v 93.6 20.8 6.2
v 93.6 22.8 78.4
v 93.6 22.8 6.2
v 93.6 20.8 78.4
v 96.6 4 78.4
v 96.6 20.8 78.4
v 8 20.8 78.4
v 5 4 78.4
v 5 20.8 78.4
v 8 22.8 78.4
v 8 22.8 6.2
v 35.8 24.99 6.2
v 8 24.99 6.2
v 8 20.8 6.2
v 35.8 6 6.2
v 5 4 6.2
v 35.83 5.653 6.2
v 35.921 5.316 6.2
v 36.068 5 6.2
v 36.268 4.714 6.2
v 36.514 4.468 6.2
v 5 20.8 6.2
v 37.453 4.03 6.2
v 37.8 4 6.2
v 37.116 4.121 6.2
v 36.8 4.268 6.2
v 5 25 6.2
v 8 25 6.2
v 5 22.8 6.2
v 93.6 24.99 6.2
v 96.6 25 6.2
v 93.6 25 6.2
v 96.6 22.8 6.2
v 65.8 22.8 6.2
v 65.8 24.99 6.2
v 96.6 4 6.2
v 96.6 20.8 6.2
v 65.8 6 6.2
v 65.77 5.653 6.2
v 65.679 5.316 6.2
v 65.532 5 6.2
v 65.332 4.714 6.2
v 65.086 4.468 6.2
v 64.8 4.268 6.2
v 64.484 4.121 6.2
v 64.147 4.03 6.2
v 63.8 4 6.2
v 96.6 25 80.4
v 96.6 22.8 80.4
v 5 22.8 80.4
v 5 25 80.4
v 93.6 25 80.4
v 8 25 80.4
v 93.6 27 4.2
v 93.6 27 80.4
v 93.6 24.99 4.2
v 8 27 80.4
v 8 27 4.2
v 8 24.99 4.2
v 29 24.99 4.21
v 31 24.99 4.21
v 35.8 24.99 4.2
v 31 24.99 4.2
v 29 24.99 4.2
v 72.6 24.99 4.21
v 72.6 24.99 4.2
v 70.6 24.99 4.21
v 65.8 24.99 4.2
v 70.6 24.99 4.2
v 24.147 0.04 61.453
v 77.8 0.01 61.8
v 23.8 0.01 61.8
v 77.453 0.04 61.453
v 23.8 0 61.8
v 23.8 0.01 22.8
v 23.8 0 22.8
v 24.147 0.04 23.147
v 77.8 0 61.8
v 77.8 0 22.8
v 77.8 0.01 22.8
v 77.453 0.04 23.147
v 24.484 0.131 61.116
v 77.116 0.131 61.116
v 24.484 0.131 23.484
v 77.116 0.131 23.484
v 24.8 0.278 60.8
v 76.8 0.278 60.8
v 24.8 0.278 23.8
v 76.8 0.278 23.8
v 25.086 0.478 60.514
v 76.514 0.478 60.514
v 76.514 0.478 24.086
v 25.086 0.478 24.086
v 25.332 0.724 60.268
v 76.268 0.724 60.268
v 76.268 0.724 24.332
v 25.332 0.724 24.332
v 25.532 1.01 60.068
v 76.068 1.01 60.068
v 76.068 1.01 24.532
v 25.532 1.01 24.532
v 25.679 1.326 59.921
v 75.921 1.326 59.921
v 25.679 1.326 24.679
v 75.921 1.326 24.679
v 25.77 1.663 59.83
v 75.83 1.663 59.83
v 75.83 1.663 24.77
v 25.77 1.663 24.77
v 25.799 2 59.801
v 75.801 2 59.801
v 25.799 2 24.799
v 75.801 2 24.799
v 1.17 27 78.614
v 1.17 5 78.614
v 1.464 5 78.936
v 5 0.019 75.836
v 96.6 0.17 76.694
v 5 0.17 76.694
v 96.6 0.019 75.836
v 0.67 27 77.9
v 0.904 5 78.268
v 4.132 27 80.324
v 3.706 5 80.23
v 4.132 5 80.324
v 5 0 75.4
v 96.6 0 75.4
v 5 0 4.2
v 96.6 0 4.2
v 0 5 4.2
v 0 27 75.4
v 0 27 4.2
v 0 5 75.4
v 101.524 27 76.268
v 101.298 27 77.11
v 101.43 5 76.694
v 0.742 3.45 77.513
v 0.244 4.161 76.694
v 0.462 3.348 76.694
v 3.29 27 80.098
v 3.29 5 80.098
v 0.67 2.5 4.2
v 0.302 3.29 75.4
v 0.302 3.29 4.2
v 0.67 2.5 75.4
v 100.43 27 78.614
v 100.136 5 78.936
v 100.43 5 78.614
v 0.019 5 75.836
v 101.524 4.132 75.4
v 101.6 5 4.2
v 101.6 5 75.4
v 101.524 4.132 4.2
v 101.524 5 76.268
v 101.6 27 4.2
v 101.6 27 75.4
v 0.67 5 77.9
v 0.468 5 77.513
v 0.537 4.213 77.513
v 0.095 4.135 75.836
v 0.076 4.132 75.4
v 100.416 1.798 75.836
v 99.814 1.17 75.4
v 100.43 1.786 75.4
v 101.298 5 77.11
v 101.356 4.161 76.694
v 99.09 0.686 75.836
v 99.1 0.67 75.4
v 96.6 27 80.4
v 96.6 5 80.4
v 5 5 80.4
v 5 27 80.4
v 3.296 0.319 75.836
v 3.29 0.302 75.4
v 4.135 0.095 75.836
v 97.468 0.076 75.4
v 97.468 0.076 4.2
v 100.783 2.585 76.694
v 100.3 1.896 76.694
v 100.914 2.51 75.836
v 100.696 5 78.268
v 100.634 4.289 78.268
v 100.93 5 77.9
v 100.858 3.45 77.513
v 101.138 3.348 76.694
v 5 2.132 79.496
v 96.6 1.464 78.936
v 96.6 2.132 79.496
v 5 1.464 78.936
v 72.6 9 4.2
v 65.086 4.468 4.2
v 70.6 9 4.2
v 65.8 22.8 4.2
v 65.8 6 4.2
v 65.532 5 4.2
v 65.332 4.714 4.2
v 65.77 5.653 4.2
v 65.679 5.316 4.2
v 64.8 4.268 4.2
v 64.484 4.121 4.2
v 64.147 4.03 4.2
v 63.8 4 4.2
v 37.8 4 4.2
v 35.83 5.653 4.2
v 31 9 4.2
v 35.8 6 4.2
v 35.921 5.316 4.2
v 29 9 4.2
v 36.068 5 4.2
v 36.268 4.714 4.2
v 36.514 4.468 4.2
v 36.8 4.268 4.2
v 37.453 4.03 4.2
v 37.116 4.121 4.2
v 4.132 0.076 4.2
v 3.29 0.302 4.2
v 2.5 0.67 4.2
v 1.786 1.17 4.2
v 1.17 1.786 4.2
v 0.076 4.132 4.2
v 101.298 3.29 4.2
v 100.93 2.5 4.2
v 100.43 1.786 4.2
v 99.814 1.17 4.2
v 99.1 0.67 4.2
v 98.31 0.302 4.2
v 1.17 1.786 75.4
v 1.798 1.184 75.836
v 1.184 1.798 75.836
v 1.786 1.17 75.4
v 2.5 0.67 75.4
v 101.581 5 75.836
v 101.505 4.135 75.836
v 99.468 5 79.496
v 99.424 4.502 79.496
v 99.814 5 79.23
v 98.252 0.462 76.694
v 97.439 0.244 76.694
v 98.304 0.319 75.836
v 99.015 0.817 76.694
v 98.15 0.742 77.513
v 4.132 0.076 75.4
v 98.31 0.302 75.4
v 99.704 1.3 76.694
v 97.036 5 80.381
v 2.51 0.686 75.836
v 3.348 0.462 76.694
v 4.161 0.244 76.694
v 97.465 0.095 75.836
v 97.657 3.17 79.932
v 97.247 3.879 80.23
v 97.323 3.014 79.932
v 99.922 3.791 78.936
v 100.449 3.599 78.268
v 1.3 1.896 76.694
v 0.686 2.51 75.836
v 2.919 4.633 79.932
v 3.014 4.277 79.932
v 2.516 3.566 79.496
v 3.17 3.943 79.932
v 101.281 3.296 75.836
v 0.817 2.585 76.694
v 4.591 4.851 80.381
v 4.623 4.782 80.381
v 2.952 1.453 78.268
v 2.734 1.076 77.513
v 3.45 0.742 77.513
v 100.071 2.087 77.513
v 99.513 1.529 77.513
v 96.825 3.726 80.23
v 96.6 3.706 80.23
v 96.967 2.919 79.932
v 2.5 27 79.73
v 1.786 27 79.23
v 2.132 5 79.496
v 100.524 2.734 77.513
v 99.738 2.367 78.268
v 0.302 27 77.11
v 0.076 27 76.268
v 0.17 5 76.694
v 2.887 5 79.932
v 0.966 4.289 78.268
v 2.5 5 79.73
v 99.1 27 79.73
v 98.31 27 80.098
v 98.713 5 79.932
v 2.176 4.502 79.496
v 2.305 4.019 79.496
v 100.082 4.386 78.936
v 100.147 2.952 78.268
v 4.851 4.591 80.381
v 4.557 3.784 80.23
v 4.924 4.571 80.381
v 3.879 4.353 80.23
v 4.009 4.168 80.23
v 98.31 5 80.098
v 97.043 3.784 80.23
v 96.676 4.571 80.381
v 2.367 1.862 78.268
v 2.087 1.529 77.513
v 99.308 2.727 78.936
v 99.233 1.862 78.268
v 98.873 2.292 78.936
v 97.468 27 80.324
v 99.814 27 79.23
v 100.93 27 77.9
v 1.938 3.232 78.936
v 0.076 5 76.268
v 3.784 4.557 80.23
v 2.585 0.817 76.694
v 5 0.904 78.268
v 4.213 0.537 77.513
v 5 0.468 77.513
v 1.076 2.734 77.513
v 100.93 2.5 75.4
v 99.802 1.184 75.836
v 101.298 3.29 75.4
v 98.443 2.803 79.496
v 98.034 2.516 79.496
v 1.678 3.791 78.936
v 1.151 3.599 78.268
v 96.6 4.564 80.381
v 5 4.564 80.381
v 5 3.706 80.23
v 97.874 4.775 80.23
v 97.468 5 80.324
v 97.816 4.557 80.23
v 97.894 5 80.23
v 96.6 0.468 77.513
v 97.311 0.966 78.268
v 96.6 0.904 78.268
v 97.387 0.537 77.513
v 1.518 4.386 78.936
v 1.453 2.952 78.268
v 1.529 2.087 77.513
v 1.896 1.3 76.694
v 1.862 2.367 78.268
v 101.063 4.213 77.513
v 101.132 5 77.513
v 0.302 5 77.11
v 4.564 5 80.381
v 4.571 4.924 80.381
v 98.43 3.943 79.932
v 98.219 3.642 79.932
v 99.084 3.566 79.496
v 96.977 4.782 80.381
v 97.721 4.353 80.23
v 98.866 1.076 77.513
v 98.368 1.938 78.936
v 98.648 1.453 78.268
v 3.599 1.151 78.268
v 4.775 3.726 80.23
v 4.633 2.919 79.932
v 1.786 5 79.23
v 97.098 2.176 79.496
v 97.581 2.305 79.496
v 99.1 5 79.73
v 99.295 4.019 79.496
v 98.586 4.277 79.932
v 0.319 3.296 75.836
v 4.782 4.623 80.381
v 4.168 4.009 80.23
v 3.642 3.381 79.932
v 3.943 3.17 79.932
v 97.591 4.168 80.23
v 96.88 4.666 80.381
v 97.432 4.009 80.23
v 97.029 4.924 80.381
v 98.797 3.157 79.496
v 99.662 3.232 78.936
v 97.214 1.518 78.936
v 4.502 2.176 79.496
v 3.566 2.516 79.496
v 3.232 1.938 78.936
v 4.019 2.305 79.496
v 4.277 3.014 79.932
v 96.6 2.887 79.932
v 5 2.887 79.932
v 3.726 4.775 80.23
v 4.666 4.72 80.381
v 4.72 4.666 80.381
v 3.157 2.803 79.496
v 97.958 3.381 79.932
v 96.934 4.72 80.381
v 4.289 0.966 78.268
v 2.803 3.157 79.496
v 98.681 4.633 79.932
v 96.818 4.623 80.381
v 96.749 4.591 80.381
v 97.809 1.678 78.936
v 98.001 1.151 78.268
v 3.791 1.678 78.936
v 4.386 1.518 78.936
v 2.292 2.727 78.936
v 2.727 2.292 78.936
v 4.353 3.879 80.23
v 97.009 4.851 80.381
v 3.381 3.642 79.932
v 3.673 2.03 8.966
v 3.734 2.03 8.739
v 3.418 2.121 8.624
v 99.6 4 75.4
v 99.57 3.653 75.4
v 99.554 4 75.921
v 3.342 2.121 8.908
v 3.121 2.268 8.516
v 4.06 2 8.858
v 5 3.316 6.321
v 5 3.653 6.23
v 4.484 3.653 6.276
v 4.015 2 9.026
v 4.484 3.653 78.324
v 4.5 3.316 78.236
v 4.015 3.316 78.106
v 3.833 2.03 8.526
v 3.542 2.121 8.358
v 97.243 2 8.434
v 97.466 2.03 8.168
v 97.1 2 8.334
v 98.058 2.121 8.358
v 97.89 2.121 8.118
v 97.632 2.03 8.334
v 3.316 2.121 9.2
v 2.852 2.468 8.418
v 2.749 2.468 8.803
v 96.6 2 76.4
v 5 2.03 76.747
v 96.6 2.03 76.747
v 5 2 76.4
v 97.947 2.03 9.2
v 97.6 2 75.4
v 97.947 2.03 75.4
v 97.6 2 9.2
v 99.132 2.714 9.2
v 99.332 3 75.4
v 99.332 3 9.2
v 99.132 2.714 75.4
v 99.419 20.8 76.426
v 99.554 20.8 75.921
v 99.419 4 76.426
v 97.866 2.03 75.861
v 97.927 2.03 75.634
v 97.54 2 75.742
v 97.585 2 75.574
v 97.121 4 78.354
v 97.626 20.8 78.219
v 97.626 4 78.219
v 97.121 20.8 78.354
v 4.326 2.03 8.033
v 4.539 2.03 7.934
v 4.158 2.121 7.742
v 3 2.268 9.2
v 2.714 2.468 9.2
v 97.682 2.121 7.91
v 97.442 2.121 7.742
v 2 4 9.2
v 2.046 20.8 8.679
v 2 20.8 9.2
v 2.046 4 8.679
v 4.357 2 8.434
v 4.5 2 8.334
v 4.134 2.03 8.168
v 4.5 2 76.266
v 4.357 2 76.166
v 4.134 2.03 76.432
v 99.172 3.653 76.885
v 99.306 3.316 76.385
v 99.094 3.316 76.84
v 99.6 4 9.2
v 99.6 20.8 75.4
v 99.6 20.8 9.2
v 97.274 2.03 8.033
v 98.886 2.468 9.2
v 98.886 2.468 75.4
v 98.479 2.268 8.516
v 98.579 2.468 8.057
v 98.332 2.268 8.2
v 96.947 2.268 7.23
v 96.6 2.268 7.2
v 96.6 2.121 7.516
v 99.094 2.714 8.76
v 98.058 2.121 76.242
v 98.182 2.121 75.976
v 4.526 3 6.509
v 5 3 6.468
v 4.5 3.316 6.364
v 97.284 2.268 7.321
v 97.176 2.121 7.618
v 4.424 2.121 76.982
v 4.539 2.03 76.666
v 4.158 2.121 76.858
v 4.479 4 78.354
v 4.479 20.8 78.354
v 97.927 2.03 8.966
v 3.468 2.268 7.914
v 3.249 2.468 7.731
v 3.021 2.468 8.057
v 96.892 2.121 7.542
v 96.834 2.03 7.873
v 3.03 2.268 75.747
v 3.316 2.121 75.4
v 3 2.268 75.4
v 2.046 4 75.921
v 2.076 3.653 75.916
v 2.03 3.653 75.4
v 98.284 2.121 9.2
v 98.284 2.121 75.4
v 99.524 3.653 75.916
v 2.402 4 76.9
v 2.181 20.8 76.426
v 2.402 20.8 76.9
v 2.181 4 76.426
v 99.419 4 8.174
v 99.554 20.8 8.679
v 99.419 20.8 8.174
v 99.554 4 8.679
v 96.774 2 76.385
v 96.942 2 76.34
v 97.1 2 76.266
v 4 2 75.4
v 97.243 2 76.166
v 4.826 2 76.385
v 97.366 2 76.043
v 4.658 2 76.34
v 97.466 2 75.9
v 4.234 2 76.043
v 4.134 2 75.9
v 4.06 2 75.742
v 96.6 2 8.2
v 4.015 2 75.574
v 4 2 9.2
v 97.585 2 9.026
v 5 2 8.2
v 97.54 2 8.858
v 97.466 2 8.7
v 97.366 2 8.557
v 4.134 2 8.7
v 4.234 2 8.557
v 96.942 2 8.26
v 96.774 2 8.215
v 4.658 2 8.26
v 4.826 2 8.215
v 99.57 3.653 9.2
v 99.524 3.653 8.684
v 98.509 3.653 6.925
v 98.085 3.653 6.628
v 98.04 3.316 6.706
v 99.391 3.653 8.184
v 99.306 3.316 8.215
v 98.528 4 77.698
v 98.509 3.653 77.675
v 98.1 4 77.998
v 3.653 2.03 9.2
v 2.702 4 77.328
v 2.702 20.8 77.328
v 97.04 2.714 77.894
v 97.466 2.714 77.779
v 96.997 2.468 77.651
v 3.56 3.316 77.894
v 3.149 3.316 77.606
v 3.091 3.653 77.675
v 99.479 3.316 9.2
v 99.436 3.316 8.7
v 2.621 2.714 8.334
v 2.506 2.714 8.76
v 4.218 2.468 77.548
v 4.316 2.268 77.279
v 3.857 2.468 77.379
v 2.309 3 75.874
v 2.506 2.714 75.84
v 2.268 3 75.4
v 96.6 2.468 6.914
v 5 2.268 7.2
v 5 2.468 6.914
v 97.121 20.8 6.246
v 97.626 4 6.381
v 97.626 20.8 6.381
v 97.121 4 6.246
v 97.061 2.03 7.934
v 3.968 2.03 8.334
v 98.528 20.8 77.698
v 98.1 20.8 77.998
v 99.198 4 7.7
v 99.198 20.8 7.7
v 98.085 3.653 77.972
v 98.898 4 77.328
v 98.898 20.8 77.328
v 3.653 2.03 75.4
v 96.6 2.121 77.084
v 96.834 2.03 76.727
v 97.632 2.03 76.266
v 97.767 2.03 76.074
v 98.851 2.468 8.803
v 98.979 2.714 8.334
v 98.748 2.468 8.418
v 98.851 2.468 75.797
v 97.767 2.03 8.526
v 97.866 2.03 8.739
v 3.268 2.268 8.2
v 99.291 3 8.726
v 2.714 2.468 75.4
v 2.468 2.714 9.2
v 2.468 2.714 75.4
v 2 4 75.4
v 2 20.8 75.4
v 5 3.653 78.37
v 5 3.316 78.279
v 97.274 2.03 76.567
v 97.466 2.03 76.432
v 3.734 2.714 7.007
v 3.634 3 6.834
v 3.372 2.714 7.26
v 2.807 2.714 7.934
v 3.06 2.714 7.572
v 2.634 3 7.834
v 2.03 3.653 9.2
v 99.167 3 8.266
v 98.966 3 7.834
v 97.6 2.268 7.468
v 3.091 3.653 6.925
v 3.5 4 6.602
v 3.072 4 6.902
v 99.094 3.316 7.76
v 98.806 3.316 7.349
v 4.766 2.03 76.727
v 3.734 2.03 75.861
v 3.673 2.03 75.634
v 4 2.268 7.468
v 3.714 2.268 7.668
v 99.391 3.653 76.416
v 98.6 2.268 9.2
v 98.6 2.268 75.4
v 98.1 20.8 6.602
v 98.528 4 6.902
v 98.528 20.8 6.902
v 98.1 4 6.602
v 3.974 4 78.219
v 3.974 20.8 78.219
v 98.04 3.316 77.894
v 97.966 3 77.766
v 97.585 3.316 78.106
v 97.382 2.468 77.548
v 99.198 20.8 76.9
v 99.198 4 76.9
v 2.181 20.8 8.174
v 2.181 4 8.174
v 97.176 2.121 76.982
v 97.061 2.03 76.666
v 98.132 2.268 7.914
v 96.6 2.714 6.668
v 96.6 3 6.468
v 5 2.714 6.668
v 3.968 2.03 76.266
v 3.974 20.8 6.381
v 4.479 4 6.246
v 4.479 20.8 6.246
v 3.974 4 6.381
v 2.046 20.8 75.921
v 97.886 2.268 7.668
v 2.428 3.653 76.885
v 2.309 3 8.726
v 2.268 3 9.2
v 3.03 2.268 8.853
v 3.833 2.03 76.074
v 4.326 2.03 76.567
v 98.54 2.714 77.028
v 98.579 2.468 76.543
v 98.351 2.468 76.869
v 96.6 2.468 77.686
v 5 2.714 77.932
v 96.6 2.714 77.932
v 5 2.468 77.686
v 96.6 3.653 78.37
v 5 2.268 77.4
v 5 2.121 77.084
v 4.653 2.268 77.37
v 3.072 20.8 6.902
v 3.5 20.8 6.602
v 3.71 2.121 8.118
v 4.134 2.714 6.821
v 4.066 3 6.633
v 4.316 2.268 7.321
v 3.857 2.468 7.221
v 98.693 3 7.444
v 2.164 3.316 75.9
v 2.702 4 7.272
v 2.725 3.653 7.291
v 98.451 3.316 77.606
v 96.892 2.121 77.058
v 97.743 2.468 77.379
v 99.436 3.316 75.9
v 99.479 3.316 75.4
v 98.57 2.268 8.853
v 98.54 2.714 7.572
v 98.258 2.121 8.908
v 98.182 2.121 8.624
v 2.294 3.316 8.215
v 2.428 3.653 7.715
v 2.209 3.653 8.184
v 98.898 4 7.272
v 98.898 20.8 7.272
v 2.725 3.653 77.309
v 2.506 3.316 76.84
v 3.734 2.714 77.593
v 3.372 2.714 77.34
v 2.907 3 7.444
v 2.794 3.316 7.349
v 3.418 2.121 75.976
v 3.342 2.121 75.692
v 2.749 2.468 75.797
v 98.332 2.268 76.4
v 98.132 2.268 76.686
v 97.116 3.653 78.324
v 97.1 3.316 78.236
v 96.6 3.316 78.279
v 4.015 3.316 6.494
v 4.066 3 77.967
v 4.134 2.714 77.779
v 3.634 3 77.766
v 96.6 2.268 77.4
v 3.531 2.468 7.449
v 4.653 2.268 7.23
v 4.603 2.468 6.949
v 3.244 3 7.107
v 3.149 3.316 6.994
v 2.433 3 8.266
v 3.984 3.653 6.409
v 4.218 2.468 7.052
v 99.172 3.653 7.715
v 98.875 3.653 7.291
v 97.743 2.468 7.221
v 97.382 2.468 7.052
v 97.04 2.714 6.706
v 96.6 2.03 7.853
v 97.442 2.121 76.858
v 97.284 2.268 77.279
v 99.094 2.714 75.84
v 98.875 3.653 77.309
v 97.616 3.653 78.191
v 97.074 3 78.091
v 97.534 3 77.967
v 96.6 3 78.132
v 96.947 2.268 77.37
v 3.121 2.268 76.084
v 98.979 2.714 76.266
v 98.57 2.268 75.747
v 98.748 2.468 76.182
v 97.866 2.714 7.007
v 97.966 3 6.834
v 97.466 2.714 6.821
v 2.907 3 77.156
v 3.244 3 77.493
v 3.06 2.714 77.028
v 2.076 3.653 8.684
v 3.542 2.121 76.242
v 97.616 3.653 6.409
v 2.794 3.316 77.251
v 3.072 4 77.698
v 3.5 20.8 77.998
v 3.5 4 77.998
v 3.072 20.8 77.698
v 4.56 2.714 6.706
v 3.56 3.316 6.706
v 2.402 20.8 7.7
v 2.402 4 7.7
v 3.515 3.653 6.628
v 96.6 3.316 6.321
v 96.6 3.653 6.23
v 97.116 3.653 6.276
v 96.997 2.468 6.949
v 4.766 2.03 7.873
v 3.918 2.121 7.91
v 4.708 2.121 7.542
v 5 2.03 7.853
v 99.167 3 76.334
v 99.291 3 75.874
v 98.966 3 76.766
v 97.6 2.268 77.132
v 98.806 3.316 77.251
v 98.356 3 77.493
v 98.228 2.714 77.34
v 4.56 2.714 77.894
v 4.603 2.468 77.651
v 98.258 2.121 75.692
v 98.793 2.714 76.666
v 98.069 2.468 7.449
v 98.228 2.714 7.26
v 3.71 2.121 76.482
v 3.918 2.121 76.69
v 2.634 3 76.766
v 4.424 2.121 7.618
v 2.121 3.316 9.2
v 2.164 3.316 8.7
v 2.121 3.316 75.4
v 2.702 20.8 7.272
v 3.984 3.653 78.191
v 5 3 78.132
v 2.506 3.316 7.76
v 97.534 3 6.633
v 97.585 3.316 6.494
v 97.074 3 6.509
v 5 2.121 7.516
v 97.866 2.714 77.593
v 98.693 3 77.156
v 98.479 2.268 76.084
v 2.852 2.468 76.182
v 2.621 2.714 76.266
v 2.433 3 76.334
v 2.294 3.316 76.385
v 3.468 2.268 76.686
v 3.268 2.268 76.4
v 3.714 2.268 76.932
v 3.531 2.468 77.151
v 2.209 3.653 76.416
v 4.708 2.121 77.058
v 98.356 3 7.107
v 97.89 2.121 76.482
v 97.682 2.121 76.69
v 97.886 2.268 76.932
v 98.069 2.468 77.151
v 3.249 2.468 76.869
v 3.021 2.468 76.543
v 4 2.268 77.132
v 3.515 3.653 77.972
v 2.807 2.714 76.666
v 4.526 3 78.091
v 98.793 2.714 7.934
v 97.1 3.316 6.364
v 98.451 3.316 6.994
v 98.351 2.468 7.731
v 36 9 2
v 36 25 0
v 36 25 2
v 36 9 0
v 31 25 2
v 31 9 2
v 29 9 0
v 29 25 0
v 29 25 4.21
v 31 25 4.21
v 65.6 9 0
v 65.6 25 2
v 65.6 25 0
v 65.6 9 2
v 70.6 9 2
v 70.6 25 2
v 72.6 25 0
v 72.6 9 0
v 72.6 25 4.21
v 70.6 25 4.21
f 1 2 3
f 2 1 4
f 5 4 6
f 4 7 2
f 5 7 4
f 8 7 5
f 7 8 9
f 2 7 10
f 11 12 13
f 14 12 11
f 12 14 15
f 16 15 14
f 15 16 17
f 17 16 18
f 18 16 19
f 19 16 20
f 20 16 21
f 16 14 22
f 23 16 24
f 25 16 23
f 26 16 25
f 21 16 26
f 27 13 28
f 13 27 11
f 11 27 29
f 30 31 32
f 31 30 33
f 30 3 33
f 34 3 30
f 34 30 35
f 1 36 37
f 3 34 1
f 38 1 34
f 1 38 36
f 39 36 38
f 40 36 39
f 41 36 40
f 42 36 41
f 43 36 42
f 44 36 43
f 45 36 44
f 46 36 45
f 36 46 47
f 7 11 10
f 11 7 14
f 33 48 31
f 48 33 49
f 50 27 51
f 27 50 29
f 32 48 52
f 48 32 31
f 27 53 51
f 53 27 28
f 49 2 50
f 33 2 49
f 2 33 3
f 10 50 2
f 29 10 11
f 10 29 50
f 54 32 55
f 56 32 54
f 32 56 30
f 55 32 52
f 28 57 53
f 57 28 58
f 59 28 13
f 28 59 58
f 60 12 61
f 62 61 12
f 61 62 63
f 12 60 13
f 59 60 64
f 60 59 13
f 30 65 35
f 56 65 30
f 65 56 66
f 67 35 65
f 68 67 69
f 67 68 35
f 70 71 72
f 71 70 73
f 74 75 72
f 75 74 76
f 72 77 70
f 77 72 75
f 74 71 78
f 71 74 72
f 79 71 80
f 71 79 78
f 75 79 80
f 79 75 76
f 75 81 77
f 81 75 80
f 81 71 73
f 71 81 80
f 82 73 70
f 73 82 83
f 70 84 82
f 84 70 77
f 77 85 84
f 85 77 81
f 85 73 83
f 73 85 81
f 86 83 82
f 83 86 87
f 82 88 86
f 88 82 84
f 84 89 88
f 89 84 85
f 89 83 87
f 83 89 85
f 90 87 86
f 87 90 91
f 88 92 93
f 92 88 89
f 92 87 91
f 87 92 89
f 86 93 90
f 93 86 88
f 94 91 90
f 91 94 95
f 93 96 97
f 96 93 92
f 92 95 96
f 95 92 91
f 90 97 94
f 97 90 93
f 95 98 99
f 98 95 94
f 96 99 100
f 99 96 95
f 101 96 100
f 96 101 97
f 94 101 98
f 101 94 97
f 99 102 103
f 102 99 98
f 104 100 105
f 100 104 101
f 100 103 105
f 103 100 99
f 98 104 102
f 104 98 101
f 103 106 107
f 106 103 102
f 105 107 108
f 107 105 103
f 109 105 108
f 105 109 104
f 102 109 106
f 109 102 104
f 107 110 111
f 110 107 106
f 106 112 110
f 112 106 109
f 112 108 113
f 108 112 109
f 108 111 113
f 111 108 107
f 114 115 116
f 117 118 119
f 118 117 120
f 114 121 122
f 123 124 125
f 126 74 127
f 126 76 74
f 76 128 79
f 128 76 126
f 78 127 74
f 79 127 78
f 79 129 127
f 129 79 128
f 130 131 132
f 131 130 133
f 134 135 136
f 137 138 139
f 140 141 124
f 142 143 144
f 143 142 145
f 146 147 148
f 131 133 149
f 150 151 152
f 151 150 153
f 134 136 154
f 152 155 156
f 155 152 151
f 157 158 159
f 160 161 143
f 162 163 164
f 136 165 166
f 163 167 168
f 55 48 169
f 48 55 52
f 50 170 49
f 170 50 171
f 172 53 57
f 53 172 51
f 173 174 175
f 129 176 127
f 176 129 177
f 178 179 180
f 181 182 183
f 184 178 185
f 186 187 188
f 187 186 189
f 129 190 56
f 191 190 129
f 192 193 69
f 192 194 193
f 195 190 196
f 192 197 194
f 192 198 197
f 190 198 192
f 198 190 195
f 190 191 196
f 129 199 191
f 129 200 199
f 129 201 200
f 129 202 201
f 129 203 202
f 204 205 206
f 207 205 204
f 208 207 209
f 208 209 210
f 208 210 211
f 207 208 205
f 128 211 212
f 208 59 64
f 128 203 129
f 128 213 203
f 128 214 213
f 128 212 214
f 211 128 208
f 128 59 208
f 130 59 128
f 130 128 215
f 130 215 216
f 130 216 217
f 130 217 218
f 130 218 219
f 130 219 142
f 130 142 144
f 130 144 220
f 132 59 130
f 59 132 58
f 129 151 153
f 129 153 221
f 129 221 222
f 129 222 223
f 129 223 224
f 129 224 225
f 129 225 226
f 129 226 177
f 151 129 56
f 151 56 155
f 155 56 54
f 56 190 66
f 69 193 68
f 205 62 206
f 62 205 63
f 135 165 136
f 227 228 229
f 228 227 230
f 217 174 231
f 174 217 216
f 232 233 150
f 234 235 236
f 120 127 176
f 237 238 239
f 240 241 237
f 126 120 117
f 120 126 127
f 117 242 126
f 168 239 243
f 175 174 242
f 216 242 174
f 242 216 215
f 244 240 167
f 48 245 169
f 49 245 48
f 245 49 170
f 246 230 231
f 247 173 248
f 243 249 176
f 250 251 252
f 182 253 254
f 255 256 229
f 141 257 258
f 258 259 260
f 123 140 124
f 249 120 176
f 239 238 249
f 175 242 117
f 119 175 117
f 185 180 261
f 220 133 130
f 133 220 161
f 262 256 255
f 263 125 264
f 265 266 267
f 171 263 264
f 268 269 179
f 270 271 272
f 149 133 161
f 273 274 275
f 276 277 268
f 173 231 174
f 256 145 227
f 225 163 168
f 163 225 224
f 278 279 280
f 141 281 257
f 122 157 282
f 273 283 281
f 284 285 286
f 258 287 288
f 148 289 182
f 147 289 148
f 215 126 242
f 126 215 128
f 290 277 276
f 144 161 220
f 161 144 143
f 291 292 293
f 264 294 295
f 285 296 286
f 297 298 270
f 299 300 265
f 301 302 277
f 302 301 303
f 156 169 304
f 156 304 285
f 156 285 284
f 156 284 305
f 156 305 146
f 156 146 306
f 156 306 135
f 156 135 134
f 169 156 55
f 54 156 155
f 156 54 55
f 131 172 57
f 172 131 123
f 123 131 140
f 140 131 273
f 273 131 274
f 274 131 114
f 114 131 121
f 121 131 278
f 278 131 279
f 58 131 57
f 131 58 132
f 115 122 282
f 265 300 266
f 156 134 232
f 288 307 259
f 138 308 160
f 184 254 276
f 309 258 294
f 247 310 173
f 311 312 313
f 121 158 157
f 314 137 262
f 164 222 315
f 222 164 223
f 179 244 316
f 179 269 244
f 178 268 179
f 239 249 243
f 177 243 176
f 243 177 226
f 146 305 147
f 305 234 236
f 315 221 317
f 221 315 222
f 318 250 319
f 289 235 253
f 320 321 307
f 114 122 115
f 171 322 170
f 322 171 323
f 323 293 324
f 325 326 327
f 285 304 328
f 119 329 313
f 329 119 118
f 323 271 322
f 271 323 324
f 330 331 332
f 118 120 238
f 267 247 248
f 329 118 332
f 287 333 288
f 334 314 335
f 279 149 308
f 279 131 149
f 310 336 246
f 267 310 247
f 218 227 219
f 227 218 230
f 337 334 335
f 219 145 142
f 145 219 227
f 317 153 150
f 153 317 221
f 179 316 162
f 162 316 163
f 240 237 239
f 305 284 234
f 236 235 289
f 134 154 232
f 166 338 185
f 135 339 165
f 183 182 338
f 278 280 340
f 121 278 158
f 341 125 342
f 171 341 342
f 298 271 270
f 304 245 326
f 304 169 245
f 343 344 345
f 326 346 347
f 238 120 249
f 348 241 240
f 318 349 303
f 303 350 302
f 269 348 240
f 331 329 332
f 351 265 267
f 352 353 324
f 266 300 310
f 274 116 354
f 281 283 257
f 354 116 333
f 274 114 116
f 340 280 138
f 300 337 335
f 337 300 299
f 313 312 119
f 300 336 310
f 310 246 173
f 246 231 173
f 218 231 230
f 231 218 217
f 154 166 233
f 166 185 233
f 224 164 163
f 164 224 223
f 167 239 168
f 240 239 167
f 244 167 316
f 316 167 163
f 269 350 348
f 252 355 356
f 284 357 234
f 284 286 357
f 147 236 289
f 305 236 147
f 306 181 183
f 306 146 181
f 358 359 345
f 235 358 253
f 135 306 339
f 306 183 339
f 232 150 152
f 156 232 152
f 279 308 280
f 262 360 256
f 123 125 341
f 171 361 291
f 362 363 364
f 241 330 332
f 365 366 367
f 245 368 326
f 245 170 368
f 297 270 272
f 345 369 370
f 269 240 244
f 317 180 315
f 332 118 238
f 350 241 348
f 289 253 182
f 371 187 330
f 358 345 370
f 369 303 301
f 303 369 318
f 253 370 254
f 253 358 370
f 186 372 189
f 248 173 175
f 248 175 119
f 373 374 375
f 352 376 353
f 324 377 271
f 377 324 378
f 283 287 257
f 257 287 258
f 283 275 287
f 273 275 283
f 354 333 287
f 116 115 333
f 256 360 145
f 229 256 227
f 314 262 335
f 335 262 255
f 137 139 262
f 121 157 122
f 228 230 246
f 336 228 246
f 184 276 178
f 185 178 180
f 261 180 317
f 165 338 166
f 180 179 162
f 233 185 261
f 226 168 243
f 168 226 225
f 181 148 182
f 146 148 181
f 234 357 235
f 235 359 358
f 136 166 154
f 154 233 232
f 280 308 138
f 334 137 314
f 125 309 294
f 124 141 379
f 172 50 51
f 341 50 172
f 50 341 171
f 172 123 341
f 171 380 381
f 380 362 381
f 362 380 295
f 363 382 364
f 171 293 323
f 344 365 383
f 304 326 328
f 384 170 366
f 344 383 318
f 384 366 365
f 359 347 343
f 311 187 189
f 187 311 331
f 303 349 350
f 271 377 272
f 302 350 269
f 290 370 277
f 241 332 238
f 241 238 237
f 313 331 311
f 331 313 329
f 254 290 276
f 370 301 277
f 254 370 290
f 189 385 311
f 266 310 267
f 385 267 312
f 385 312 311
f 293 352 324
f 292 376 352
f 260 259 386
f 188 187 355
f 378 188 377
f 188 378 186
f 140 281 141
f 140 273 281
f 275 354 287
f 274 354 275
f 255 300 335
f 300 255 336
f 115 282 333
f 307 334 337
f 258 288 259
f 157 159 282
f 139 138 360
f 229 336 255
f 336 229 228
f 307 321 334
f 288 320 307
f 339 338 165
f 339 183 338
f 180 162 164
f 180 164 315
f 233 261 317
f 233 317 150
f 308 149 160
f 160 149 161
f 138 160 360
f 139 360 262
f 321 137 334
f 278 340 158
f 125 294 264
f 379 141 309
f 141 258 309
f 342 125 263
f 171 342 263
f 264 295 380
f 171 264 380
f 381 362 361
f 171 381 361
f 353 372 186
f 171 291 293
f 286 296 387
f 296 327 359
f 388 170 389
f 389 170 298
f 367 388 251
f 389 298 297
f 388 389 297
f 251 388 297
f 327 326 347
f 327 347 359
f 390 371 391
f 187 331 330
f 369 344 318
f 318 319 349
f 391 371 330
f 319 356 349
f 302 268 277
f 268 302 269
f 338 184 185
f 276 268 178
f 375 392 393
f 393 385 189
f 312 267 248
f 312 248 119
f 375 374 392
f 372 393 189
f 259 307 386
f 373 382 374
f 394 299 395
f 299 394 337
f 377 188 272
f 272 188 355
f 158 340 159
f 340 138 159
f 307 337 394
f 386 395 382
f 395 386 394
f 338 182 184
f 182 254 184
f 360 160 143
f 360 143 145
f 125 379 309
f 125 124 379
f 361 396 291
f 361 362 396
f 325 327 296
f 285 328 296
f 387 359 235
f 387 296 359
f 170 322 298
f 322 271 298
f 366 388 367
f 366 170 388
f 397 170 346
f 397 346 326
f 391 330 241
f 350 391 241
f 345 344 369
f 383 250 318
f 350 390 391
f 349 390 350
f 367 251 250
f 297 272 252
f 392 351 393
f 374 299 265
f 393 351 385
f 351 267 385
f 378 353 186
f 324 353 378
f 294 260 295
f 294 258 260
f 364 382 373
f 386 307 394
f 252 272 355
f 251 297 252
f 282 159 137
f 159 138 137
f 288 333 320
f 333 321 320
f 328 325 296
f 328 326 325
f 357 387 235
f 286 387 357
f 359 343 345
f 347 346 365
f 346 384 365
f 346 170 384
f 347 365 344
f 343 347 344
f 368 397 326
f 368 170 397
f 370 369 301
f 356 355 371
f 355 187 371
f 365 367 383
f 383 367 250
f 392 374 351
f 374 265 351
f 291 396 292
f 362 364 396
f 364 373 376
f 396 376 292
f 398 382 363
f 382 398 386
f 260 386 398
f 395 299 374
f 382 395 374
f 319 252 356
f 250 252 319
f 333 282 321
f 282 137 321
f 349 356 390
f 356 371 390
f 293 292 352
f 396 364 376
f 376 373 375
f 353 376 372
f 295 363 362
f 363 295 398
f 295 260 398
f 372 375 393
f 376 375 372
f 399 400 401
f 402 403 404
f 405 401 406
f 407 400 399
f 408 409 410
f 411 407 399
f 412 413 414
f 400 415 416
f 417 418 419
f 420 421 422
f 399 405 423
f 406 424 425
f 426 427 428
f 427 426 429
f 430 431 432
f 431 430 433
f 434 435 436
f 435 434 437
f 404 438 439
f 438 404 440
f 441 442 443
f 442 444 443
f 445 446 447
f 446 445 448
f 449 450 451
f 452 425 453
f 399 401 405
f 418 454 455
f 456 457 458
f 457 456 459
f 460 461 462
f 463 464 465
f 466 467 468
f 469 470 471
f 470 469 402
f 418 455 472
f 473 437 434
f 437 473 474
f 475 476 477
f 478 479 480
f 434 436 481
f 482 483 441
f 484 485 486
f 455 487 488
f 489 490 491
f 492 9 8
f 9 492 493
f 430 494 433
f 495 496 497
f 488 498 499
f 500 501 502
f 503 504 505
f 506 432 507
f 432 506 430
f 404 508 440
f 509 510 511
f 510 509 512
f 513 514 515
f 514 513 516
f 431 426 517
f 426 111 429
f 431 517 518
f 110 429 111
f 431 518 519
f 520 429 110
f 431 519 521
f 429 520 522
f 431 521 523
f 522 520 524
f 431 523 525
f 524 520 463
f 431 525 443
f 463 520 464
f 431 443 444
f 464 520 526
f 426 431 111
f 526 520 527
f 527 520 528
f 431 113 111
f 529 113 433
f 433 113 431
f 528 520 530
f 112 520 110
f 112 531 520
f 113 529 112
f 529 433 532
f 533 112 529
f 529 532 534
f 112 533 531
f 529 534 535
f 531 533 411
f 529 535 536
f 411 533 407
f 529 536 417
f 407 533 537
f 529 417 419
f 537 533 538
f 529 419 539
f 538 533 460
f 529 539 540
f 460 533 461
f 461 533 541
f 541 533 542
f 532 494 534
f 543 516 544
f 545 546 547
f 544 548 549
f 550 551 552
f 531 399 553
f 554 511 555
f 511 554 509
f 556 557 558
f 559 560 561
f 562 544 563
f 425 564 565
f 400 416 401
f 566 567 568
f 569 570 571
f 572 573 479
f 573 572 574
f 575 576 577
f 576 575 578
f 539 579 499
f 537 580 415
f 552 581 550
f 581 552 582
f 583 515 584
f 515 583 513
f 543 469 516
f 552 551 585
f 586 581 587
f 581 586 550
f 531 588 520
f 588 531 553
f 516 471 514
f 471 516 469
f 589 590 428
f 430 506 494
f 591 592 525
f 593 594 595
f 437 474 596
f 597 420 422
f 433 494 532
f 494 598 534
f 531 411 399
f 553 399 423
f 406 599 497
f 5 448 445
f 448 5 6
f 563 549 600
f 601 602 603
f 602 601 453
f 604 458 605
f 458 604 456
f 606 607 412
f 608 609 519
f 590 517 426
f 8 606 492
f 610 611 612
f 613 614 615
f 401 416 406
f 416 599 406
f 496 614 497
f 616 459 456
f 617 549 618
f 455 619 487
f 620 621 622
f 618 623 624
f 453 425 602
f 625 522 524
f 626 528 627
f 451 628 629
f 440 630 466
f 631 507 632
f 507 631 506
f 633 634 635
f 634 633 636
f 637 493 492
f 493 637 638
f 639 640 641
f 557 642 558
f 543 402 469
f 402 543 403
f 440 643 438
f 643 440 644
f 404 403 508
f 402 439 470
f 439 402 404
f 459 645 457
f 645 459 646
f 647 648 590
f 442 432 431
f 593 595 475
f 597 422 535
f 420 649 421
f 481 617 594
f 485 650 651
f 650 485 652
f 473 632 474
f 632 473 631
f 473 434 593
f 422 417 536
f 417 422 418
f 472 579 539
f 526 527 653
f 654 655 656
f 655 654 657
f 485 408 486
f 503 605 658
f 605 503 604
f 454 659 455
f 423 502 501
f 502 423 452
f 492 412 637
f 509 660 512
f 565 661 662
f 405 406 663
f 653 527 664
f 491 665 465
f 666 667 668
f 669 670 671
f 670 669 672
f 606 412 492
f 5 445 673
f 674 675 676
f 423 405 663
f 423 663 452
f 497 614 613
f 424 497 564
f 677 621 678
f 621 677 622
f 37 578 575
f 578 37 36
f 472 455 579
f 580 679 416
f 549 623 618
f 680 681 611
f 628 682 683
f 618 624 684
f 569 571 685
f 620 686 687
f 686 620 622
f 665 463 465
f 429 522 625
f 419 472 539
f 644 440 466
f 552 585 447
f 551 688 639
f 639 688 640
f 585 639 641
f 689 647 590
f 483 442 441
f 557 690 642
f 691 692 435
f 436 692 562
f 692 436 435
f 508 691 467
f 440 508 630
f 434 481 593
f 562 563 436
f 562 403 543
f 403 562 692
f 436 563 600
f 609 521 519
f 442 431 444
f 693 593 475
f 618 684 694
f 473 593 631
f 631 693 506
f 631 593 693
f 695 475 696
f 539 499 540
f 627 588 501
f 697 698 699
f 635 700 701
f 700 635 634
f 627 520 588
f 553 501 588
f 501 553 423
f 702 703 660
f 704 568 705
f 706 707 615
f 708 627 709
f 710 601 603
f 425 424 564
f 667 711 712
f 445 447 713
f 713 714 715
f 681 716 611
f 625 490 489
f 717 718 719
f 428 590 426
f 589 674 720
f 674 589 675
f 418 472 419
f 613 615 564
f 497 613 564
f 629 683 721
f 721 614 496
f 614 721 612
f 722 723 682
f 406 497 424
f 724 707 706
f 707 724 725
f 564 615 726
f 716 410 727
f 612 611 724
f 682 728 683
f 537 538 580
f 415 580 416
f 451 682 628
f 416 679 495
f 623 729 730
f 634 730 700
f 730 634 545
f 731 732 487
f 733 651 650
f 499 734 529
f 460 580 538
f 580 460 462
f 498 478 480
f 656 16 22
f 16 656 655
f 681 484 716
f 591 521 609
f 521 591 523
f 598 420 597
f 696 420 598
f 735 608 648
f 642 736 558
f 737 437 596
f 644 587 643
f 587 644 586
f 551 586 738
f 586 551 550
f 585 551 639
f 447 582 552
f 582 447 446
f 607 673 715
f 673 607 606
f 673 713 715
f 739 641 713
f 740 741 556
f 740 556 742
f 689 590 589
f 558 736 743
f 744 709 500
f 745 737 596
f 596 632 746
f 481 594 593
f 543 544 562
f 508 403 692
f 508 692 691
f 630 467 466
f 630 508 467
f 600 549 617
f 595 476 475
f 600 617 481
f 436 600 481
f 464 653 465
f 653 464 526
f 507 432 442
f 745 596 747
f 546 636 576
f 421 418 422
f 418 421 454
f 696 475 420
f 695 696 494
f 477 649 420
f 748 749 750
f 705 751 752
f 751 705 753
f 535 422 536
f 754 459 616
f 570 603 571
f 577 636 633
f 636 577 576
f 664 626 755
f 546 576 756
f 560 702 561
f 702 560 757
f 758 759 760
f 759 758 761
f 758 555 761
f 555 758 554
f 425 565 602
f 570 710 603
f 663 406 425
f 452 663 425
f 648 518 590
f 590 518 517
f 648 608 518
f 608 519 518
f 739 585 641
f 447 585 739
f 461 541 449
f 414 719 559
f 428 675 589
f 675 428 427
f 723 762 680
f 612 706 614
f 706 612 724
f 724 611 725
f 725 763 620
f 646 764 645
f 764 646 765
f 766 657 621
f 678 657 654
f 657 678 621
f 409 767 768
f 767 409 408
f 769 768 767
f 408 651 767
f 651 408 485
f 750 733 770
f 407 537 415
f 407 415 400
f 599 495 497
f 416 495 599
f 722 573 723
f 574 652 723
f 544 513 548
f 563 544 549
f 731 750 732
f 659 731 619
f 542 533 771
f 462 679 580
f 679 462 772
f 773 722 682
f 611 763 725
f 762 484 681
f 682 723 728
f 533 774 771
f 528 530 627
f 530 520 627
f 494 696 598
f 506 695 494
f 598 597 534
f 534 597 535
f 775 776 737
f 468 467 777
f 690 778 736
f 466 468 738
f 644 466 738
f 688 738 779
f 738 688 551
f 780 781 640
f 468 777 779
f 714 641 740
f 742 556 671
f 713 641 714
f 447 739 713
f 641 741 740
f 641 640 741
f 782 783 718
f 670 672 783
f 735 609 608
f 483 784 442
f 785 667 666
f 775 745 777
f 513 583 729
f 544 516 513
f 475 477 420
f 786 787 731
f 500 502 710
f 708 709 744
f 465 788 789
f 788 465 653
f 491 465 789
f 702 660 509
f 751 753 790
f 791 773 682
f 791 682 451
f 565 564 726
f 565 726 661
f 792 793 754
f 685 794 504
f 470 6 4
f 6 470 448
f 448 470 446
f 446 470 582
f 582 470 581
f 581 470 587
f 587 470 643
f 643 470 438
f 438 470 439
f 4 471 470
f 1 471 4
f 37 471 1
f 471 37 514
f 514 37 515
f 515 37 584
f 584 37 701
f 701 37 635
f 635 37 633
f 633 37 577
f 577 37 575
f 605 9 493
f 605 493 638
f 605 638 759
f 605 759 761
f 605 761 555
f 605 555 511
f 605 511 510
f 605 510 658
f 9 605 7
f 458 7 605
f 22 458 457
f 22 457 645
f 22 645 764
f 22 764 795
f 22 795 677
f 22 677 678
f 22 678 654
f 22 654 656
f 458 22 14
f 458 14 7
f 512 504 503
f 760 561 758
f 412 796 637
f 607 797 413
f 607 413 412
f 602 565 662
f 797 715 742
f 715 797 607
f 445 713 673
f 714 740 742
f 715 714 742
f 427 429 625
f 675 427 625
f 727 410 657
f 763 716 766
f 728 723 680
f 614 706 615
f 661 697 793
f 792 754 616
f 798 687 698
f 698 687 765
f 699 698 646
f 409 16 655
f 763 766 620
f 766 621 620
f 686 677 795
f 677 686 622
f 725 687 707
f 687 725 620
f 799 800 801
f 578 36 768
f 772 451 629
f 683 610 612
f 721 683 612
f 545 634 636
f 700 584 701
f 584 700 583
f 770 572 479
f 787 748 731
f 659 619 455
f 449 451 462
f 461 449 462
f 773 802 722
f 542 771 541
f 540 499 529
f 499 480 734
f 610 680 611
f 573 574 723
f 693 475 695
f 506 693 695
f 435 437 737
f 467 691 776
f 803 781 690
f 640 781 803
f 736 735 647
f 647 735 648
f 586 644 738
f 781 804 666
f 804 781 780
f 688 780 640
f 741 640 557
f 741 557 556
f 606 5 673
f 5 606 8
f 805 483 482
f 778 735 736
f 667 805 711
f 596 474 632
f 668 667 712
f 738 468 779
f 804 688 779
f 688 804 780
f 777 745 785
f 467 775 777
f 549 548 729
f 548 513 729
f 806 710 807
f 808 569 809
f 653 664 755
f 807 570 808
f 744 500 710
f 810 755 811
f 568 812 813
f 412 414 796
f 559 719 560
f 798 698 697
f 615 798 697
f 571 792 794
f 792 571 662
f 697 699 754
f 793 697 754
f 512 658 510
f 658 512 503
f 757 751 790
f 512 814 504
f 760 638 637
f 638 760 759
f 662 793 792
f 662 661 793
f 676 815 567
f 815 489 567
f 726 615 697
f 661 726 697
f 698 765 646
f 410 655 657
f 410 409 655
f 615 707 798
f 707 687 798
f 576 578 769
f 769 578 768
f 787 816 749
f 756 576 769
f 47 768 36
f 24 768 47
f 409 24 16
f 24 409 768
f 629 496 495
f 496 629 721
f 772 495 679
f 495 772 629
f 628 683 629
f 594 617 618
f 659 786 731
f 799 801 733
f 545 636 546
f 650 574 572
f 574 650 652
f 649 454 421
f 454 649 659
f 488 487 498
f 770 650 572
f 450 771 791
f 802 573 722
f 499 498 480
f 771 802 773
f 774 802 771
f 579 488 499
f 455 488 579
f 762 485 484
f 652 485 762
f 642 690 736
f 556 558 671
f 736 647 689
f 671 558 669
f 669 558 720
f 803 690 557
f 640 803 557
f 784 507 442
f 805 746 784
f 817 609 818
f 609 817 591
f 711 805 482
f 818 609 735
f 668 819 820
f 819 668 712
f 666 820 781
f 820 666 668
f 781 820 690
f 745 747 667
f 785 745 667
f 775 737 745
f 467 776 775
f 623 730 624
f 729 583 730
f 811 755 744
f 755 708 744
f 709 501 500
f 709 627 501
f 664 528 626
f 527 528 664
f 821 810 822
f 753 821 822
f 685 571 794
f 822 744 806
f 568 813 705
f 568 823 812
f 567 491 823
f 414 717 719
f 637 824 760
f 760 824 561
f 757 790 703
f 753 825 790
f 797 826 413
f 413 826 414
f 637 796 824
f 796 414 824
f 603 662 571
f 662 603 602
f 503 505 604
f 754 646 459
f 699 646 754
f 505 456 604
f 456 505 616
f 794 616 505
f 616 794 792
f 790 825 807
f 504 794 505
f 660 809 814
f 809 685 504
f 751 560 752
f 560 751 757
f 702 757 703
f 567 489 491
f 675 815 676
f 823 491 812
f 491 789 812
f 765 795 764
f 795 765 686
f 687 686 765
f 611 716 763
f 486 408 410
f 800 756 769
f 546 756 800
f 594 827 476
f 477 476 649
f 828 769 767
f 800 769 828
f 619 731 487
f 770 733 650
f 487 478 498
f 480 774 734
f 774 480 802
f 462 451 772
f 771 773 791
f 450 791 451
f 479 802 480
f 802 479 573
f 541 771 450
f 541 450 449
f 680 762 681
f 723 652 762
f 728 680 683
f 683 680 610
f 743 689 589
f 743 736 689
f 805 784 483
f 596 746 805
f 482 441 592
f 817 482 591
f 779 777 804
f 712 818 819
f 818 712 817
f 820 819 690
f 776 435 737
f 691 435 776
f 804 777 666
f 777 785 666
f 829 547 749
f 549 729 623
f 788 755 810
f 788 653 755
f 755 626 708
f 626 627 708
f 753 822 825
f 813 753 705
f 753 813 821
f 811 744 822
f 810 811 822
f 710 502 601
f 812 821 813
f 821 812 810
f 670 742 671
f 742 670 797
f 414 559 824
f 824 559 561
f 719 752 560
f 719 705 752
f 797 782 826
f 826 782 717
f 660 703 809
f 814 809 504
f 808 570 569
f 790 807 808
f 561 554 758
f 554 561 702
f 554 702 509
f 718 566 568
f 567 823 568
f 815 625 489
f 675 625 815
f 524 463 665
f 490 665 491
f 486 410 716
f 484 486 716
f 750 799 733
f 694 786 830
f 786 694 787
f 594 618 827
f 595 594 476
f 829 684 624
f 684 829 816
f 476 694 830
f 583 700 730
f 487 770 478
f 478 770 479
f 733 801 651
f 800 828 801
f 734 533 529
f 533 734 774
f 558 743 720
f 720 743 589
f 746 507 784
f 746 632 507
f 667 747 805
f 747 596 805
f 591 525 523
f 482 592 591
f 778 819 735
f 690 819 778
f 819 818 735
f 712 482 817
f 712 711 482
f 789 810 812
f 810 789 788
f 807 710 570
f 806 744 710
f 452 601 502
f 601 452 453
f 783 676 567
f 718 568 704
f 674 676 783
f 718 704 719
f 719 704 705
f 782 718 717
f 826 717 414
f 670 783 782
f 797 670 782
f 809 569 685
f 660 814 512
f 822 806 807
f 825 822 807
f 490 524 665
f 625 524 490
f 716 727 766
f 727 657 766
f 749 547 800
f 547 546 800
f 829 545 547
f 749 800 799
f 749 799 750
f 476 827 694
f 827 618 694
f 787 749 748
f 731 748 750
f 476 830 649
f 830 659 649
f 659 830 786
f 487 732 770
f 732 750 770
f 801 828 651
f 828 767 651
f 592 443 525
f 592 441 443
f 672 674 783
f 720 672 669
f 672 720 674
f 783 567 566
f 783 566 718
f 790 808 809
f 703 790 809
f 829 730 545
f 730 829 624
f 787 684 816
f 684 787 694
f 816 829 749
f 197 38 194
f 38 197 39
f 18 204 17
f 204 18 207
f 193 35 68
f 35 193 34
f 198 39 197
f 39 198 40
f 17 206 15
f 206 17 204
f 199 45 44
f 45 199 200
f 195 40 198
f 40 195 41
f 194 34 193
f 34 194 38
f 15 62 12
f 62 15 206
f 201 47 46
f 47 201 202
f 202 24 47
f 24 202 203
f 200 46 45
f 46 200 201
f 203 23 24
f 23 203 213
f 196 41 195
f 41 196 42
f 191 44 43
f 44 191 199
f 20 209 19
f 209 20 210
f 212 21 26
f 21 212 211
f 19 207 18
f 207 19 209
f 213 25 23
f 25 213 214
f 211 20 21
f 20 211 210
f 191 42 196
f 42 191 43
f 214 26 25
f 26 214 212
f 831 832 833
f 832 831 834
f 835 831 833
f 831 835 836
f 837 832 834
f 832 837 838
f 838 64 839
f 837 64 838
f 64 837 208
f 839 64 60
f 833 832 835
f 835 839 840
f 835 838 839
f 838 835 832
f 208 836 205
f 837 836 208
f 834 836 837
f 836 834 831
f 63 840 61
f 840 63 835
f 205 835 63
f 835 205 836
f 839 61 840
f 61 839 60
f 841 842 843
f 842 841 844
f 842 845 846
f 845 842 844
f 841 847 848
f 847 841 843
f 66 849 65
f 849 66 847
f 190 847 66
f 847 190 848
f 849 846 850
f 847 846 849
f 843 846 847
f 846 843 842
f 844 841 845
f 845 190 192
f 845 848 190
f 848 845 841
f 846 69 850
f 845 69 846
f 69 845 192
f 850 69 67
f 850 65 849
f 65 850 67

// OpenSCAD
// Display box (SolidWorks part 003). Sits on top of the center body and holds the
// Waveshare 2" ST7789 LCD (seen through the front window) plus the microcontroller.
// The back door (display_door.scad) slides down into the grooves from the top.
// Frame: X = width (left->right seen from the front), Y = depth (0 = front face with
// the screen window, 27 = back / wall side), Z = height (0 = bottom of the tabs).

// --- overall shell ---
display_w = 101.6;          // outer width
display_d = 27.0;           // outer depth
display_body_z = 4.2;       // bottom of the box body (the tabs hang below this)
display_h = 80.4;           // overall height including the tabs
display_outer_r = 5.0;      // round on the front vertical edges and the top edges
display_wall = 2.0;         // front / side / top / floor wall thickness

// --- main cavity (LCD + MCU) ---
display_cav_back = 20.8;    // cavity depth ends here (front face of the groove ribs)
display_cav_r = 3.0;        // corner radius of the cavity seen from the back (XZ)
display_cav_front_r = 2.0;  // round where the cavity meets the inside of the front wall

// --- back door grooves ---
display_rib_w = 6.0;        // ribs in front of the groove (x 2..8 and 93.6..99.6)
display_groove_y = 22.8;    // groove front face
display_groove_t = 2.2;     // groove depth in Y (door flange is 2.0)
display_slot_inset = 5.0;   // groove / flange slot spans x 5..96.6
display_opening_inset = 8.0; // back opening for the door lip: x 8..93.6, full height

// --- screen window ---
display_win_w = 50.0;       // window width at the inside face of the front wall
display_win_h = 35.0;       // window height at the inside face
display_win_z = 24.8;       // window bottom (inside face)
display_win_r = 2.0;        // full round on the front edge of the window (= wall)

// --- wire pass-through in the floor ---
display_wire_x = 35.8;      // left edge (right edge = 65.8, centered)
display_wire_w = 30.0;
display_wire_y = 4.0;       // front edge; runs back into the door opening
display_wire_r = 2.0;       // front corner radius

// --- bottom tabs (L-shaped hooks into the center body) ---
display_tab_x = 29.0;       // left tab outer edge (right tab mirrored about center)
display_tab_y = 9.0;
display_tab_len = 16.0;     // Y extent (9..25)
display_tab_foot_w = 7.0;   // foot width, pointing toward the center
display_tab_foot_t = 2.0;   // foot thickness (z 0..2)
display_tab_stem_w = 2.0;   // stem width (z 2..4.2)

display_eps = 0.01;

// Outer shell: box with R5 on the two front vertical edges and on the three top
// edges (front, left, right); back and bottom edges are sharp.
module display_outer() {
  r = display_outer_r; top = display_h - r;
  hull() {
    for (x = [r, display_w - r]) {
      translate([x, r, top]) sphere(r);                                       // top-front corners
      translate([x, r, display_body_z]) cylinder(r = r, h = top - display_body_z); // front vertical edges
      translate([x, r, top]) rotate([-90, 0, 0]) cylinder(r = r, h = display_d - r); // top side edges
    }
    translate([0, r, display_body_z]) cube([display_w, display_d - r, display_eps]);
  }
}

// Main cavity: rounded rectangle (R3) in XZ, with an R2 round where it meets the
// inside of the front wall (torus at each corner).
module display_cavity() {
  R = display_cav_r; fr = display_cav_front_r; w = display_wall;
  z0 = display_body_z + w; z1 = display_h - w;
  y0 = w + fr;
  hull() for (x = [w + R, display_w - w - R], z = [z0 + R, z1 - R]) {
    translate([x, y0, z]) rotate([-90, 0, 0]) {
      rotate_extrude() intersection() { translate([R - fr, 0]) circle(fr); translate([0, -fr]) square([R, 2 * fr]); }
      cylinder(r = R, h = display_cav_back - y0);
    }
  }
}

// Door groove: straight slot x 5..96.6 from the cavity floor up through the top
// (the door flange slides down into it), plus the gap between the two ribs.
module display_door_track() {
  w = display_wall;
  z0 = display_body_z + w; z1 = display_h - w;
  // gap between the ribs, joining cavity and groove
  translate([display_opening_inset, display_cav_back - display_eps, z0])
    cube([display_w - 2 * display_opening_inset, display_groove_y - display_cav_back + 2 * display_eps, z1 - z0]);
  // groove for the door flange, open at the top
  translate([display_slot_inset, display_groove_y, z0])
    cube([display_w - 2 * display_slot_inset, display_groove_t, display_h]);
  // back opening for the door lip (full height, through the floor and top)
  translate([display_opening_inset, display_groove_y + display_groove_t - display_eps, display_body_z - 1])
    cube([display_w - 2 * display_opening_inset, display_d, display_h]);
}

// Screen window: 50 x 35 at the inside face, front edge fully rounded (R2), built
// as a stack of frusta following the quarter-round profile.
module display_window() {
  n = 9; r = display_win_r; // 10 degree steps, like the other rounds
  cx = display_w / 2; cz = display_win_z + display_win_h / 2;
  // point on the quarter round at angle a: depth y = r(1-cos a), flare e = r(1-sin a)
  module layer(a) let(y = r * (1 - cos(a)), e = r * (1 - sin(a)))
    translate([cx - display_win_w / 2 - e, y, cz - display_win_h / 2 - e])
      cube([display_win_w + 2 * e, display_eps, display_win_h + 2 * e]);
  for (i = [0 : n - 1]) hull() { layer(90 * i / n); layer(90 * (i + 1) / n); }
  translate([cx - display_win_w / 2, -display_eps, display_win_z]) cube([display_win_w, display_wall + 1, display_win_h]);
  translate([cx - display_win_w / 2 - r, -1, cz - display_win_h / 2 - r]) cube([display_win_w + 2 * r, 1 + display_eps, display_win_h + 2 * r]);
}

// Wire pass-through: slot in the floor, R2 at the front corners, open to the back.
module display_wire_pass() {
  r = display_wire_r;
  translate([0, 0, display_body_z - 1]) linear_extrude(display_wall + 2)
    hull() {
      for (x = [display_wire_x + r, display_wire_x + display_wire_w - r])
        translate([x, display_wire_y + r]) circle(r);
      translate([display_wire_x, display_groove_y]) square([display_wire_w, display_d - display_groove_y]);
    }
}

// Bottom tab: L-shaped hook, stem on the outside, foot pointing toward the center.
module display_tab() {
  translate([display_tab_x, display_tab_y, 0]) {
    cube([display_tab_foot_w, display_tab_len, display_tab_foot_t]);
    cube([display_tab_stem_w, display_tab_len, display_body_z + display_eps]);
  }
}

module display_box() {
  $fn = 36; // the original mesh uses 10 degree facets on every round
  difference() {
    display_outer();
    display_cavity();
    display_door_track();
    display_window();
    display_wire_pass();
  }
  display_tab();
  translate([display_w, 0, 0]) mirror([1, 0, 0]) display_tab();
}

display_box();
